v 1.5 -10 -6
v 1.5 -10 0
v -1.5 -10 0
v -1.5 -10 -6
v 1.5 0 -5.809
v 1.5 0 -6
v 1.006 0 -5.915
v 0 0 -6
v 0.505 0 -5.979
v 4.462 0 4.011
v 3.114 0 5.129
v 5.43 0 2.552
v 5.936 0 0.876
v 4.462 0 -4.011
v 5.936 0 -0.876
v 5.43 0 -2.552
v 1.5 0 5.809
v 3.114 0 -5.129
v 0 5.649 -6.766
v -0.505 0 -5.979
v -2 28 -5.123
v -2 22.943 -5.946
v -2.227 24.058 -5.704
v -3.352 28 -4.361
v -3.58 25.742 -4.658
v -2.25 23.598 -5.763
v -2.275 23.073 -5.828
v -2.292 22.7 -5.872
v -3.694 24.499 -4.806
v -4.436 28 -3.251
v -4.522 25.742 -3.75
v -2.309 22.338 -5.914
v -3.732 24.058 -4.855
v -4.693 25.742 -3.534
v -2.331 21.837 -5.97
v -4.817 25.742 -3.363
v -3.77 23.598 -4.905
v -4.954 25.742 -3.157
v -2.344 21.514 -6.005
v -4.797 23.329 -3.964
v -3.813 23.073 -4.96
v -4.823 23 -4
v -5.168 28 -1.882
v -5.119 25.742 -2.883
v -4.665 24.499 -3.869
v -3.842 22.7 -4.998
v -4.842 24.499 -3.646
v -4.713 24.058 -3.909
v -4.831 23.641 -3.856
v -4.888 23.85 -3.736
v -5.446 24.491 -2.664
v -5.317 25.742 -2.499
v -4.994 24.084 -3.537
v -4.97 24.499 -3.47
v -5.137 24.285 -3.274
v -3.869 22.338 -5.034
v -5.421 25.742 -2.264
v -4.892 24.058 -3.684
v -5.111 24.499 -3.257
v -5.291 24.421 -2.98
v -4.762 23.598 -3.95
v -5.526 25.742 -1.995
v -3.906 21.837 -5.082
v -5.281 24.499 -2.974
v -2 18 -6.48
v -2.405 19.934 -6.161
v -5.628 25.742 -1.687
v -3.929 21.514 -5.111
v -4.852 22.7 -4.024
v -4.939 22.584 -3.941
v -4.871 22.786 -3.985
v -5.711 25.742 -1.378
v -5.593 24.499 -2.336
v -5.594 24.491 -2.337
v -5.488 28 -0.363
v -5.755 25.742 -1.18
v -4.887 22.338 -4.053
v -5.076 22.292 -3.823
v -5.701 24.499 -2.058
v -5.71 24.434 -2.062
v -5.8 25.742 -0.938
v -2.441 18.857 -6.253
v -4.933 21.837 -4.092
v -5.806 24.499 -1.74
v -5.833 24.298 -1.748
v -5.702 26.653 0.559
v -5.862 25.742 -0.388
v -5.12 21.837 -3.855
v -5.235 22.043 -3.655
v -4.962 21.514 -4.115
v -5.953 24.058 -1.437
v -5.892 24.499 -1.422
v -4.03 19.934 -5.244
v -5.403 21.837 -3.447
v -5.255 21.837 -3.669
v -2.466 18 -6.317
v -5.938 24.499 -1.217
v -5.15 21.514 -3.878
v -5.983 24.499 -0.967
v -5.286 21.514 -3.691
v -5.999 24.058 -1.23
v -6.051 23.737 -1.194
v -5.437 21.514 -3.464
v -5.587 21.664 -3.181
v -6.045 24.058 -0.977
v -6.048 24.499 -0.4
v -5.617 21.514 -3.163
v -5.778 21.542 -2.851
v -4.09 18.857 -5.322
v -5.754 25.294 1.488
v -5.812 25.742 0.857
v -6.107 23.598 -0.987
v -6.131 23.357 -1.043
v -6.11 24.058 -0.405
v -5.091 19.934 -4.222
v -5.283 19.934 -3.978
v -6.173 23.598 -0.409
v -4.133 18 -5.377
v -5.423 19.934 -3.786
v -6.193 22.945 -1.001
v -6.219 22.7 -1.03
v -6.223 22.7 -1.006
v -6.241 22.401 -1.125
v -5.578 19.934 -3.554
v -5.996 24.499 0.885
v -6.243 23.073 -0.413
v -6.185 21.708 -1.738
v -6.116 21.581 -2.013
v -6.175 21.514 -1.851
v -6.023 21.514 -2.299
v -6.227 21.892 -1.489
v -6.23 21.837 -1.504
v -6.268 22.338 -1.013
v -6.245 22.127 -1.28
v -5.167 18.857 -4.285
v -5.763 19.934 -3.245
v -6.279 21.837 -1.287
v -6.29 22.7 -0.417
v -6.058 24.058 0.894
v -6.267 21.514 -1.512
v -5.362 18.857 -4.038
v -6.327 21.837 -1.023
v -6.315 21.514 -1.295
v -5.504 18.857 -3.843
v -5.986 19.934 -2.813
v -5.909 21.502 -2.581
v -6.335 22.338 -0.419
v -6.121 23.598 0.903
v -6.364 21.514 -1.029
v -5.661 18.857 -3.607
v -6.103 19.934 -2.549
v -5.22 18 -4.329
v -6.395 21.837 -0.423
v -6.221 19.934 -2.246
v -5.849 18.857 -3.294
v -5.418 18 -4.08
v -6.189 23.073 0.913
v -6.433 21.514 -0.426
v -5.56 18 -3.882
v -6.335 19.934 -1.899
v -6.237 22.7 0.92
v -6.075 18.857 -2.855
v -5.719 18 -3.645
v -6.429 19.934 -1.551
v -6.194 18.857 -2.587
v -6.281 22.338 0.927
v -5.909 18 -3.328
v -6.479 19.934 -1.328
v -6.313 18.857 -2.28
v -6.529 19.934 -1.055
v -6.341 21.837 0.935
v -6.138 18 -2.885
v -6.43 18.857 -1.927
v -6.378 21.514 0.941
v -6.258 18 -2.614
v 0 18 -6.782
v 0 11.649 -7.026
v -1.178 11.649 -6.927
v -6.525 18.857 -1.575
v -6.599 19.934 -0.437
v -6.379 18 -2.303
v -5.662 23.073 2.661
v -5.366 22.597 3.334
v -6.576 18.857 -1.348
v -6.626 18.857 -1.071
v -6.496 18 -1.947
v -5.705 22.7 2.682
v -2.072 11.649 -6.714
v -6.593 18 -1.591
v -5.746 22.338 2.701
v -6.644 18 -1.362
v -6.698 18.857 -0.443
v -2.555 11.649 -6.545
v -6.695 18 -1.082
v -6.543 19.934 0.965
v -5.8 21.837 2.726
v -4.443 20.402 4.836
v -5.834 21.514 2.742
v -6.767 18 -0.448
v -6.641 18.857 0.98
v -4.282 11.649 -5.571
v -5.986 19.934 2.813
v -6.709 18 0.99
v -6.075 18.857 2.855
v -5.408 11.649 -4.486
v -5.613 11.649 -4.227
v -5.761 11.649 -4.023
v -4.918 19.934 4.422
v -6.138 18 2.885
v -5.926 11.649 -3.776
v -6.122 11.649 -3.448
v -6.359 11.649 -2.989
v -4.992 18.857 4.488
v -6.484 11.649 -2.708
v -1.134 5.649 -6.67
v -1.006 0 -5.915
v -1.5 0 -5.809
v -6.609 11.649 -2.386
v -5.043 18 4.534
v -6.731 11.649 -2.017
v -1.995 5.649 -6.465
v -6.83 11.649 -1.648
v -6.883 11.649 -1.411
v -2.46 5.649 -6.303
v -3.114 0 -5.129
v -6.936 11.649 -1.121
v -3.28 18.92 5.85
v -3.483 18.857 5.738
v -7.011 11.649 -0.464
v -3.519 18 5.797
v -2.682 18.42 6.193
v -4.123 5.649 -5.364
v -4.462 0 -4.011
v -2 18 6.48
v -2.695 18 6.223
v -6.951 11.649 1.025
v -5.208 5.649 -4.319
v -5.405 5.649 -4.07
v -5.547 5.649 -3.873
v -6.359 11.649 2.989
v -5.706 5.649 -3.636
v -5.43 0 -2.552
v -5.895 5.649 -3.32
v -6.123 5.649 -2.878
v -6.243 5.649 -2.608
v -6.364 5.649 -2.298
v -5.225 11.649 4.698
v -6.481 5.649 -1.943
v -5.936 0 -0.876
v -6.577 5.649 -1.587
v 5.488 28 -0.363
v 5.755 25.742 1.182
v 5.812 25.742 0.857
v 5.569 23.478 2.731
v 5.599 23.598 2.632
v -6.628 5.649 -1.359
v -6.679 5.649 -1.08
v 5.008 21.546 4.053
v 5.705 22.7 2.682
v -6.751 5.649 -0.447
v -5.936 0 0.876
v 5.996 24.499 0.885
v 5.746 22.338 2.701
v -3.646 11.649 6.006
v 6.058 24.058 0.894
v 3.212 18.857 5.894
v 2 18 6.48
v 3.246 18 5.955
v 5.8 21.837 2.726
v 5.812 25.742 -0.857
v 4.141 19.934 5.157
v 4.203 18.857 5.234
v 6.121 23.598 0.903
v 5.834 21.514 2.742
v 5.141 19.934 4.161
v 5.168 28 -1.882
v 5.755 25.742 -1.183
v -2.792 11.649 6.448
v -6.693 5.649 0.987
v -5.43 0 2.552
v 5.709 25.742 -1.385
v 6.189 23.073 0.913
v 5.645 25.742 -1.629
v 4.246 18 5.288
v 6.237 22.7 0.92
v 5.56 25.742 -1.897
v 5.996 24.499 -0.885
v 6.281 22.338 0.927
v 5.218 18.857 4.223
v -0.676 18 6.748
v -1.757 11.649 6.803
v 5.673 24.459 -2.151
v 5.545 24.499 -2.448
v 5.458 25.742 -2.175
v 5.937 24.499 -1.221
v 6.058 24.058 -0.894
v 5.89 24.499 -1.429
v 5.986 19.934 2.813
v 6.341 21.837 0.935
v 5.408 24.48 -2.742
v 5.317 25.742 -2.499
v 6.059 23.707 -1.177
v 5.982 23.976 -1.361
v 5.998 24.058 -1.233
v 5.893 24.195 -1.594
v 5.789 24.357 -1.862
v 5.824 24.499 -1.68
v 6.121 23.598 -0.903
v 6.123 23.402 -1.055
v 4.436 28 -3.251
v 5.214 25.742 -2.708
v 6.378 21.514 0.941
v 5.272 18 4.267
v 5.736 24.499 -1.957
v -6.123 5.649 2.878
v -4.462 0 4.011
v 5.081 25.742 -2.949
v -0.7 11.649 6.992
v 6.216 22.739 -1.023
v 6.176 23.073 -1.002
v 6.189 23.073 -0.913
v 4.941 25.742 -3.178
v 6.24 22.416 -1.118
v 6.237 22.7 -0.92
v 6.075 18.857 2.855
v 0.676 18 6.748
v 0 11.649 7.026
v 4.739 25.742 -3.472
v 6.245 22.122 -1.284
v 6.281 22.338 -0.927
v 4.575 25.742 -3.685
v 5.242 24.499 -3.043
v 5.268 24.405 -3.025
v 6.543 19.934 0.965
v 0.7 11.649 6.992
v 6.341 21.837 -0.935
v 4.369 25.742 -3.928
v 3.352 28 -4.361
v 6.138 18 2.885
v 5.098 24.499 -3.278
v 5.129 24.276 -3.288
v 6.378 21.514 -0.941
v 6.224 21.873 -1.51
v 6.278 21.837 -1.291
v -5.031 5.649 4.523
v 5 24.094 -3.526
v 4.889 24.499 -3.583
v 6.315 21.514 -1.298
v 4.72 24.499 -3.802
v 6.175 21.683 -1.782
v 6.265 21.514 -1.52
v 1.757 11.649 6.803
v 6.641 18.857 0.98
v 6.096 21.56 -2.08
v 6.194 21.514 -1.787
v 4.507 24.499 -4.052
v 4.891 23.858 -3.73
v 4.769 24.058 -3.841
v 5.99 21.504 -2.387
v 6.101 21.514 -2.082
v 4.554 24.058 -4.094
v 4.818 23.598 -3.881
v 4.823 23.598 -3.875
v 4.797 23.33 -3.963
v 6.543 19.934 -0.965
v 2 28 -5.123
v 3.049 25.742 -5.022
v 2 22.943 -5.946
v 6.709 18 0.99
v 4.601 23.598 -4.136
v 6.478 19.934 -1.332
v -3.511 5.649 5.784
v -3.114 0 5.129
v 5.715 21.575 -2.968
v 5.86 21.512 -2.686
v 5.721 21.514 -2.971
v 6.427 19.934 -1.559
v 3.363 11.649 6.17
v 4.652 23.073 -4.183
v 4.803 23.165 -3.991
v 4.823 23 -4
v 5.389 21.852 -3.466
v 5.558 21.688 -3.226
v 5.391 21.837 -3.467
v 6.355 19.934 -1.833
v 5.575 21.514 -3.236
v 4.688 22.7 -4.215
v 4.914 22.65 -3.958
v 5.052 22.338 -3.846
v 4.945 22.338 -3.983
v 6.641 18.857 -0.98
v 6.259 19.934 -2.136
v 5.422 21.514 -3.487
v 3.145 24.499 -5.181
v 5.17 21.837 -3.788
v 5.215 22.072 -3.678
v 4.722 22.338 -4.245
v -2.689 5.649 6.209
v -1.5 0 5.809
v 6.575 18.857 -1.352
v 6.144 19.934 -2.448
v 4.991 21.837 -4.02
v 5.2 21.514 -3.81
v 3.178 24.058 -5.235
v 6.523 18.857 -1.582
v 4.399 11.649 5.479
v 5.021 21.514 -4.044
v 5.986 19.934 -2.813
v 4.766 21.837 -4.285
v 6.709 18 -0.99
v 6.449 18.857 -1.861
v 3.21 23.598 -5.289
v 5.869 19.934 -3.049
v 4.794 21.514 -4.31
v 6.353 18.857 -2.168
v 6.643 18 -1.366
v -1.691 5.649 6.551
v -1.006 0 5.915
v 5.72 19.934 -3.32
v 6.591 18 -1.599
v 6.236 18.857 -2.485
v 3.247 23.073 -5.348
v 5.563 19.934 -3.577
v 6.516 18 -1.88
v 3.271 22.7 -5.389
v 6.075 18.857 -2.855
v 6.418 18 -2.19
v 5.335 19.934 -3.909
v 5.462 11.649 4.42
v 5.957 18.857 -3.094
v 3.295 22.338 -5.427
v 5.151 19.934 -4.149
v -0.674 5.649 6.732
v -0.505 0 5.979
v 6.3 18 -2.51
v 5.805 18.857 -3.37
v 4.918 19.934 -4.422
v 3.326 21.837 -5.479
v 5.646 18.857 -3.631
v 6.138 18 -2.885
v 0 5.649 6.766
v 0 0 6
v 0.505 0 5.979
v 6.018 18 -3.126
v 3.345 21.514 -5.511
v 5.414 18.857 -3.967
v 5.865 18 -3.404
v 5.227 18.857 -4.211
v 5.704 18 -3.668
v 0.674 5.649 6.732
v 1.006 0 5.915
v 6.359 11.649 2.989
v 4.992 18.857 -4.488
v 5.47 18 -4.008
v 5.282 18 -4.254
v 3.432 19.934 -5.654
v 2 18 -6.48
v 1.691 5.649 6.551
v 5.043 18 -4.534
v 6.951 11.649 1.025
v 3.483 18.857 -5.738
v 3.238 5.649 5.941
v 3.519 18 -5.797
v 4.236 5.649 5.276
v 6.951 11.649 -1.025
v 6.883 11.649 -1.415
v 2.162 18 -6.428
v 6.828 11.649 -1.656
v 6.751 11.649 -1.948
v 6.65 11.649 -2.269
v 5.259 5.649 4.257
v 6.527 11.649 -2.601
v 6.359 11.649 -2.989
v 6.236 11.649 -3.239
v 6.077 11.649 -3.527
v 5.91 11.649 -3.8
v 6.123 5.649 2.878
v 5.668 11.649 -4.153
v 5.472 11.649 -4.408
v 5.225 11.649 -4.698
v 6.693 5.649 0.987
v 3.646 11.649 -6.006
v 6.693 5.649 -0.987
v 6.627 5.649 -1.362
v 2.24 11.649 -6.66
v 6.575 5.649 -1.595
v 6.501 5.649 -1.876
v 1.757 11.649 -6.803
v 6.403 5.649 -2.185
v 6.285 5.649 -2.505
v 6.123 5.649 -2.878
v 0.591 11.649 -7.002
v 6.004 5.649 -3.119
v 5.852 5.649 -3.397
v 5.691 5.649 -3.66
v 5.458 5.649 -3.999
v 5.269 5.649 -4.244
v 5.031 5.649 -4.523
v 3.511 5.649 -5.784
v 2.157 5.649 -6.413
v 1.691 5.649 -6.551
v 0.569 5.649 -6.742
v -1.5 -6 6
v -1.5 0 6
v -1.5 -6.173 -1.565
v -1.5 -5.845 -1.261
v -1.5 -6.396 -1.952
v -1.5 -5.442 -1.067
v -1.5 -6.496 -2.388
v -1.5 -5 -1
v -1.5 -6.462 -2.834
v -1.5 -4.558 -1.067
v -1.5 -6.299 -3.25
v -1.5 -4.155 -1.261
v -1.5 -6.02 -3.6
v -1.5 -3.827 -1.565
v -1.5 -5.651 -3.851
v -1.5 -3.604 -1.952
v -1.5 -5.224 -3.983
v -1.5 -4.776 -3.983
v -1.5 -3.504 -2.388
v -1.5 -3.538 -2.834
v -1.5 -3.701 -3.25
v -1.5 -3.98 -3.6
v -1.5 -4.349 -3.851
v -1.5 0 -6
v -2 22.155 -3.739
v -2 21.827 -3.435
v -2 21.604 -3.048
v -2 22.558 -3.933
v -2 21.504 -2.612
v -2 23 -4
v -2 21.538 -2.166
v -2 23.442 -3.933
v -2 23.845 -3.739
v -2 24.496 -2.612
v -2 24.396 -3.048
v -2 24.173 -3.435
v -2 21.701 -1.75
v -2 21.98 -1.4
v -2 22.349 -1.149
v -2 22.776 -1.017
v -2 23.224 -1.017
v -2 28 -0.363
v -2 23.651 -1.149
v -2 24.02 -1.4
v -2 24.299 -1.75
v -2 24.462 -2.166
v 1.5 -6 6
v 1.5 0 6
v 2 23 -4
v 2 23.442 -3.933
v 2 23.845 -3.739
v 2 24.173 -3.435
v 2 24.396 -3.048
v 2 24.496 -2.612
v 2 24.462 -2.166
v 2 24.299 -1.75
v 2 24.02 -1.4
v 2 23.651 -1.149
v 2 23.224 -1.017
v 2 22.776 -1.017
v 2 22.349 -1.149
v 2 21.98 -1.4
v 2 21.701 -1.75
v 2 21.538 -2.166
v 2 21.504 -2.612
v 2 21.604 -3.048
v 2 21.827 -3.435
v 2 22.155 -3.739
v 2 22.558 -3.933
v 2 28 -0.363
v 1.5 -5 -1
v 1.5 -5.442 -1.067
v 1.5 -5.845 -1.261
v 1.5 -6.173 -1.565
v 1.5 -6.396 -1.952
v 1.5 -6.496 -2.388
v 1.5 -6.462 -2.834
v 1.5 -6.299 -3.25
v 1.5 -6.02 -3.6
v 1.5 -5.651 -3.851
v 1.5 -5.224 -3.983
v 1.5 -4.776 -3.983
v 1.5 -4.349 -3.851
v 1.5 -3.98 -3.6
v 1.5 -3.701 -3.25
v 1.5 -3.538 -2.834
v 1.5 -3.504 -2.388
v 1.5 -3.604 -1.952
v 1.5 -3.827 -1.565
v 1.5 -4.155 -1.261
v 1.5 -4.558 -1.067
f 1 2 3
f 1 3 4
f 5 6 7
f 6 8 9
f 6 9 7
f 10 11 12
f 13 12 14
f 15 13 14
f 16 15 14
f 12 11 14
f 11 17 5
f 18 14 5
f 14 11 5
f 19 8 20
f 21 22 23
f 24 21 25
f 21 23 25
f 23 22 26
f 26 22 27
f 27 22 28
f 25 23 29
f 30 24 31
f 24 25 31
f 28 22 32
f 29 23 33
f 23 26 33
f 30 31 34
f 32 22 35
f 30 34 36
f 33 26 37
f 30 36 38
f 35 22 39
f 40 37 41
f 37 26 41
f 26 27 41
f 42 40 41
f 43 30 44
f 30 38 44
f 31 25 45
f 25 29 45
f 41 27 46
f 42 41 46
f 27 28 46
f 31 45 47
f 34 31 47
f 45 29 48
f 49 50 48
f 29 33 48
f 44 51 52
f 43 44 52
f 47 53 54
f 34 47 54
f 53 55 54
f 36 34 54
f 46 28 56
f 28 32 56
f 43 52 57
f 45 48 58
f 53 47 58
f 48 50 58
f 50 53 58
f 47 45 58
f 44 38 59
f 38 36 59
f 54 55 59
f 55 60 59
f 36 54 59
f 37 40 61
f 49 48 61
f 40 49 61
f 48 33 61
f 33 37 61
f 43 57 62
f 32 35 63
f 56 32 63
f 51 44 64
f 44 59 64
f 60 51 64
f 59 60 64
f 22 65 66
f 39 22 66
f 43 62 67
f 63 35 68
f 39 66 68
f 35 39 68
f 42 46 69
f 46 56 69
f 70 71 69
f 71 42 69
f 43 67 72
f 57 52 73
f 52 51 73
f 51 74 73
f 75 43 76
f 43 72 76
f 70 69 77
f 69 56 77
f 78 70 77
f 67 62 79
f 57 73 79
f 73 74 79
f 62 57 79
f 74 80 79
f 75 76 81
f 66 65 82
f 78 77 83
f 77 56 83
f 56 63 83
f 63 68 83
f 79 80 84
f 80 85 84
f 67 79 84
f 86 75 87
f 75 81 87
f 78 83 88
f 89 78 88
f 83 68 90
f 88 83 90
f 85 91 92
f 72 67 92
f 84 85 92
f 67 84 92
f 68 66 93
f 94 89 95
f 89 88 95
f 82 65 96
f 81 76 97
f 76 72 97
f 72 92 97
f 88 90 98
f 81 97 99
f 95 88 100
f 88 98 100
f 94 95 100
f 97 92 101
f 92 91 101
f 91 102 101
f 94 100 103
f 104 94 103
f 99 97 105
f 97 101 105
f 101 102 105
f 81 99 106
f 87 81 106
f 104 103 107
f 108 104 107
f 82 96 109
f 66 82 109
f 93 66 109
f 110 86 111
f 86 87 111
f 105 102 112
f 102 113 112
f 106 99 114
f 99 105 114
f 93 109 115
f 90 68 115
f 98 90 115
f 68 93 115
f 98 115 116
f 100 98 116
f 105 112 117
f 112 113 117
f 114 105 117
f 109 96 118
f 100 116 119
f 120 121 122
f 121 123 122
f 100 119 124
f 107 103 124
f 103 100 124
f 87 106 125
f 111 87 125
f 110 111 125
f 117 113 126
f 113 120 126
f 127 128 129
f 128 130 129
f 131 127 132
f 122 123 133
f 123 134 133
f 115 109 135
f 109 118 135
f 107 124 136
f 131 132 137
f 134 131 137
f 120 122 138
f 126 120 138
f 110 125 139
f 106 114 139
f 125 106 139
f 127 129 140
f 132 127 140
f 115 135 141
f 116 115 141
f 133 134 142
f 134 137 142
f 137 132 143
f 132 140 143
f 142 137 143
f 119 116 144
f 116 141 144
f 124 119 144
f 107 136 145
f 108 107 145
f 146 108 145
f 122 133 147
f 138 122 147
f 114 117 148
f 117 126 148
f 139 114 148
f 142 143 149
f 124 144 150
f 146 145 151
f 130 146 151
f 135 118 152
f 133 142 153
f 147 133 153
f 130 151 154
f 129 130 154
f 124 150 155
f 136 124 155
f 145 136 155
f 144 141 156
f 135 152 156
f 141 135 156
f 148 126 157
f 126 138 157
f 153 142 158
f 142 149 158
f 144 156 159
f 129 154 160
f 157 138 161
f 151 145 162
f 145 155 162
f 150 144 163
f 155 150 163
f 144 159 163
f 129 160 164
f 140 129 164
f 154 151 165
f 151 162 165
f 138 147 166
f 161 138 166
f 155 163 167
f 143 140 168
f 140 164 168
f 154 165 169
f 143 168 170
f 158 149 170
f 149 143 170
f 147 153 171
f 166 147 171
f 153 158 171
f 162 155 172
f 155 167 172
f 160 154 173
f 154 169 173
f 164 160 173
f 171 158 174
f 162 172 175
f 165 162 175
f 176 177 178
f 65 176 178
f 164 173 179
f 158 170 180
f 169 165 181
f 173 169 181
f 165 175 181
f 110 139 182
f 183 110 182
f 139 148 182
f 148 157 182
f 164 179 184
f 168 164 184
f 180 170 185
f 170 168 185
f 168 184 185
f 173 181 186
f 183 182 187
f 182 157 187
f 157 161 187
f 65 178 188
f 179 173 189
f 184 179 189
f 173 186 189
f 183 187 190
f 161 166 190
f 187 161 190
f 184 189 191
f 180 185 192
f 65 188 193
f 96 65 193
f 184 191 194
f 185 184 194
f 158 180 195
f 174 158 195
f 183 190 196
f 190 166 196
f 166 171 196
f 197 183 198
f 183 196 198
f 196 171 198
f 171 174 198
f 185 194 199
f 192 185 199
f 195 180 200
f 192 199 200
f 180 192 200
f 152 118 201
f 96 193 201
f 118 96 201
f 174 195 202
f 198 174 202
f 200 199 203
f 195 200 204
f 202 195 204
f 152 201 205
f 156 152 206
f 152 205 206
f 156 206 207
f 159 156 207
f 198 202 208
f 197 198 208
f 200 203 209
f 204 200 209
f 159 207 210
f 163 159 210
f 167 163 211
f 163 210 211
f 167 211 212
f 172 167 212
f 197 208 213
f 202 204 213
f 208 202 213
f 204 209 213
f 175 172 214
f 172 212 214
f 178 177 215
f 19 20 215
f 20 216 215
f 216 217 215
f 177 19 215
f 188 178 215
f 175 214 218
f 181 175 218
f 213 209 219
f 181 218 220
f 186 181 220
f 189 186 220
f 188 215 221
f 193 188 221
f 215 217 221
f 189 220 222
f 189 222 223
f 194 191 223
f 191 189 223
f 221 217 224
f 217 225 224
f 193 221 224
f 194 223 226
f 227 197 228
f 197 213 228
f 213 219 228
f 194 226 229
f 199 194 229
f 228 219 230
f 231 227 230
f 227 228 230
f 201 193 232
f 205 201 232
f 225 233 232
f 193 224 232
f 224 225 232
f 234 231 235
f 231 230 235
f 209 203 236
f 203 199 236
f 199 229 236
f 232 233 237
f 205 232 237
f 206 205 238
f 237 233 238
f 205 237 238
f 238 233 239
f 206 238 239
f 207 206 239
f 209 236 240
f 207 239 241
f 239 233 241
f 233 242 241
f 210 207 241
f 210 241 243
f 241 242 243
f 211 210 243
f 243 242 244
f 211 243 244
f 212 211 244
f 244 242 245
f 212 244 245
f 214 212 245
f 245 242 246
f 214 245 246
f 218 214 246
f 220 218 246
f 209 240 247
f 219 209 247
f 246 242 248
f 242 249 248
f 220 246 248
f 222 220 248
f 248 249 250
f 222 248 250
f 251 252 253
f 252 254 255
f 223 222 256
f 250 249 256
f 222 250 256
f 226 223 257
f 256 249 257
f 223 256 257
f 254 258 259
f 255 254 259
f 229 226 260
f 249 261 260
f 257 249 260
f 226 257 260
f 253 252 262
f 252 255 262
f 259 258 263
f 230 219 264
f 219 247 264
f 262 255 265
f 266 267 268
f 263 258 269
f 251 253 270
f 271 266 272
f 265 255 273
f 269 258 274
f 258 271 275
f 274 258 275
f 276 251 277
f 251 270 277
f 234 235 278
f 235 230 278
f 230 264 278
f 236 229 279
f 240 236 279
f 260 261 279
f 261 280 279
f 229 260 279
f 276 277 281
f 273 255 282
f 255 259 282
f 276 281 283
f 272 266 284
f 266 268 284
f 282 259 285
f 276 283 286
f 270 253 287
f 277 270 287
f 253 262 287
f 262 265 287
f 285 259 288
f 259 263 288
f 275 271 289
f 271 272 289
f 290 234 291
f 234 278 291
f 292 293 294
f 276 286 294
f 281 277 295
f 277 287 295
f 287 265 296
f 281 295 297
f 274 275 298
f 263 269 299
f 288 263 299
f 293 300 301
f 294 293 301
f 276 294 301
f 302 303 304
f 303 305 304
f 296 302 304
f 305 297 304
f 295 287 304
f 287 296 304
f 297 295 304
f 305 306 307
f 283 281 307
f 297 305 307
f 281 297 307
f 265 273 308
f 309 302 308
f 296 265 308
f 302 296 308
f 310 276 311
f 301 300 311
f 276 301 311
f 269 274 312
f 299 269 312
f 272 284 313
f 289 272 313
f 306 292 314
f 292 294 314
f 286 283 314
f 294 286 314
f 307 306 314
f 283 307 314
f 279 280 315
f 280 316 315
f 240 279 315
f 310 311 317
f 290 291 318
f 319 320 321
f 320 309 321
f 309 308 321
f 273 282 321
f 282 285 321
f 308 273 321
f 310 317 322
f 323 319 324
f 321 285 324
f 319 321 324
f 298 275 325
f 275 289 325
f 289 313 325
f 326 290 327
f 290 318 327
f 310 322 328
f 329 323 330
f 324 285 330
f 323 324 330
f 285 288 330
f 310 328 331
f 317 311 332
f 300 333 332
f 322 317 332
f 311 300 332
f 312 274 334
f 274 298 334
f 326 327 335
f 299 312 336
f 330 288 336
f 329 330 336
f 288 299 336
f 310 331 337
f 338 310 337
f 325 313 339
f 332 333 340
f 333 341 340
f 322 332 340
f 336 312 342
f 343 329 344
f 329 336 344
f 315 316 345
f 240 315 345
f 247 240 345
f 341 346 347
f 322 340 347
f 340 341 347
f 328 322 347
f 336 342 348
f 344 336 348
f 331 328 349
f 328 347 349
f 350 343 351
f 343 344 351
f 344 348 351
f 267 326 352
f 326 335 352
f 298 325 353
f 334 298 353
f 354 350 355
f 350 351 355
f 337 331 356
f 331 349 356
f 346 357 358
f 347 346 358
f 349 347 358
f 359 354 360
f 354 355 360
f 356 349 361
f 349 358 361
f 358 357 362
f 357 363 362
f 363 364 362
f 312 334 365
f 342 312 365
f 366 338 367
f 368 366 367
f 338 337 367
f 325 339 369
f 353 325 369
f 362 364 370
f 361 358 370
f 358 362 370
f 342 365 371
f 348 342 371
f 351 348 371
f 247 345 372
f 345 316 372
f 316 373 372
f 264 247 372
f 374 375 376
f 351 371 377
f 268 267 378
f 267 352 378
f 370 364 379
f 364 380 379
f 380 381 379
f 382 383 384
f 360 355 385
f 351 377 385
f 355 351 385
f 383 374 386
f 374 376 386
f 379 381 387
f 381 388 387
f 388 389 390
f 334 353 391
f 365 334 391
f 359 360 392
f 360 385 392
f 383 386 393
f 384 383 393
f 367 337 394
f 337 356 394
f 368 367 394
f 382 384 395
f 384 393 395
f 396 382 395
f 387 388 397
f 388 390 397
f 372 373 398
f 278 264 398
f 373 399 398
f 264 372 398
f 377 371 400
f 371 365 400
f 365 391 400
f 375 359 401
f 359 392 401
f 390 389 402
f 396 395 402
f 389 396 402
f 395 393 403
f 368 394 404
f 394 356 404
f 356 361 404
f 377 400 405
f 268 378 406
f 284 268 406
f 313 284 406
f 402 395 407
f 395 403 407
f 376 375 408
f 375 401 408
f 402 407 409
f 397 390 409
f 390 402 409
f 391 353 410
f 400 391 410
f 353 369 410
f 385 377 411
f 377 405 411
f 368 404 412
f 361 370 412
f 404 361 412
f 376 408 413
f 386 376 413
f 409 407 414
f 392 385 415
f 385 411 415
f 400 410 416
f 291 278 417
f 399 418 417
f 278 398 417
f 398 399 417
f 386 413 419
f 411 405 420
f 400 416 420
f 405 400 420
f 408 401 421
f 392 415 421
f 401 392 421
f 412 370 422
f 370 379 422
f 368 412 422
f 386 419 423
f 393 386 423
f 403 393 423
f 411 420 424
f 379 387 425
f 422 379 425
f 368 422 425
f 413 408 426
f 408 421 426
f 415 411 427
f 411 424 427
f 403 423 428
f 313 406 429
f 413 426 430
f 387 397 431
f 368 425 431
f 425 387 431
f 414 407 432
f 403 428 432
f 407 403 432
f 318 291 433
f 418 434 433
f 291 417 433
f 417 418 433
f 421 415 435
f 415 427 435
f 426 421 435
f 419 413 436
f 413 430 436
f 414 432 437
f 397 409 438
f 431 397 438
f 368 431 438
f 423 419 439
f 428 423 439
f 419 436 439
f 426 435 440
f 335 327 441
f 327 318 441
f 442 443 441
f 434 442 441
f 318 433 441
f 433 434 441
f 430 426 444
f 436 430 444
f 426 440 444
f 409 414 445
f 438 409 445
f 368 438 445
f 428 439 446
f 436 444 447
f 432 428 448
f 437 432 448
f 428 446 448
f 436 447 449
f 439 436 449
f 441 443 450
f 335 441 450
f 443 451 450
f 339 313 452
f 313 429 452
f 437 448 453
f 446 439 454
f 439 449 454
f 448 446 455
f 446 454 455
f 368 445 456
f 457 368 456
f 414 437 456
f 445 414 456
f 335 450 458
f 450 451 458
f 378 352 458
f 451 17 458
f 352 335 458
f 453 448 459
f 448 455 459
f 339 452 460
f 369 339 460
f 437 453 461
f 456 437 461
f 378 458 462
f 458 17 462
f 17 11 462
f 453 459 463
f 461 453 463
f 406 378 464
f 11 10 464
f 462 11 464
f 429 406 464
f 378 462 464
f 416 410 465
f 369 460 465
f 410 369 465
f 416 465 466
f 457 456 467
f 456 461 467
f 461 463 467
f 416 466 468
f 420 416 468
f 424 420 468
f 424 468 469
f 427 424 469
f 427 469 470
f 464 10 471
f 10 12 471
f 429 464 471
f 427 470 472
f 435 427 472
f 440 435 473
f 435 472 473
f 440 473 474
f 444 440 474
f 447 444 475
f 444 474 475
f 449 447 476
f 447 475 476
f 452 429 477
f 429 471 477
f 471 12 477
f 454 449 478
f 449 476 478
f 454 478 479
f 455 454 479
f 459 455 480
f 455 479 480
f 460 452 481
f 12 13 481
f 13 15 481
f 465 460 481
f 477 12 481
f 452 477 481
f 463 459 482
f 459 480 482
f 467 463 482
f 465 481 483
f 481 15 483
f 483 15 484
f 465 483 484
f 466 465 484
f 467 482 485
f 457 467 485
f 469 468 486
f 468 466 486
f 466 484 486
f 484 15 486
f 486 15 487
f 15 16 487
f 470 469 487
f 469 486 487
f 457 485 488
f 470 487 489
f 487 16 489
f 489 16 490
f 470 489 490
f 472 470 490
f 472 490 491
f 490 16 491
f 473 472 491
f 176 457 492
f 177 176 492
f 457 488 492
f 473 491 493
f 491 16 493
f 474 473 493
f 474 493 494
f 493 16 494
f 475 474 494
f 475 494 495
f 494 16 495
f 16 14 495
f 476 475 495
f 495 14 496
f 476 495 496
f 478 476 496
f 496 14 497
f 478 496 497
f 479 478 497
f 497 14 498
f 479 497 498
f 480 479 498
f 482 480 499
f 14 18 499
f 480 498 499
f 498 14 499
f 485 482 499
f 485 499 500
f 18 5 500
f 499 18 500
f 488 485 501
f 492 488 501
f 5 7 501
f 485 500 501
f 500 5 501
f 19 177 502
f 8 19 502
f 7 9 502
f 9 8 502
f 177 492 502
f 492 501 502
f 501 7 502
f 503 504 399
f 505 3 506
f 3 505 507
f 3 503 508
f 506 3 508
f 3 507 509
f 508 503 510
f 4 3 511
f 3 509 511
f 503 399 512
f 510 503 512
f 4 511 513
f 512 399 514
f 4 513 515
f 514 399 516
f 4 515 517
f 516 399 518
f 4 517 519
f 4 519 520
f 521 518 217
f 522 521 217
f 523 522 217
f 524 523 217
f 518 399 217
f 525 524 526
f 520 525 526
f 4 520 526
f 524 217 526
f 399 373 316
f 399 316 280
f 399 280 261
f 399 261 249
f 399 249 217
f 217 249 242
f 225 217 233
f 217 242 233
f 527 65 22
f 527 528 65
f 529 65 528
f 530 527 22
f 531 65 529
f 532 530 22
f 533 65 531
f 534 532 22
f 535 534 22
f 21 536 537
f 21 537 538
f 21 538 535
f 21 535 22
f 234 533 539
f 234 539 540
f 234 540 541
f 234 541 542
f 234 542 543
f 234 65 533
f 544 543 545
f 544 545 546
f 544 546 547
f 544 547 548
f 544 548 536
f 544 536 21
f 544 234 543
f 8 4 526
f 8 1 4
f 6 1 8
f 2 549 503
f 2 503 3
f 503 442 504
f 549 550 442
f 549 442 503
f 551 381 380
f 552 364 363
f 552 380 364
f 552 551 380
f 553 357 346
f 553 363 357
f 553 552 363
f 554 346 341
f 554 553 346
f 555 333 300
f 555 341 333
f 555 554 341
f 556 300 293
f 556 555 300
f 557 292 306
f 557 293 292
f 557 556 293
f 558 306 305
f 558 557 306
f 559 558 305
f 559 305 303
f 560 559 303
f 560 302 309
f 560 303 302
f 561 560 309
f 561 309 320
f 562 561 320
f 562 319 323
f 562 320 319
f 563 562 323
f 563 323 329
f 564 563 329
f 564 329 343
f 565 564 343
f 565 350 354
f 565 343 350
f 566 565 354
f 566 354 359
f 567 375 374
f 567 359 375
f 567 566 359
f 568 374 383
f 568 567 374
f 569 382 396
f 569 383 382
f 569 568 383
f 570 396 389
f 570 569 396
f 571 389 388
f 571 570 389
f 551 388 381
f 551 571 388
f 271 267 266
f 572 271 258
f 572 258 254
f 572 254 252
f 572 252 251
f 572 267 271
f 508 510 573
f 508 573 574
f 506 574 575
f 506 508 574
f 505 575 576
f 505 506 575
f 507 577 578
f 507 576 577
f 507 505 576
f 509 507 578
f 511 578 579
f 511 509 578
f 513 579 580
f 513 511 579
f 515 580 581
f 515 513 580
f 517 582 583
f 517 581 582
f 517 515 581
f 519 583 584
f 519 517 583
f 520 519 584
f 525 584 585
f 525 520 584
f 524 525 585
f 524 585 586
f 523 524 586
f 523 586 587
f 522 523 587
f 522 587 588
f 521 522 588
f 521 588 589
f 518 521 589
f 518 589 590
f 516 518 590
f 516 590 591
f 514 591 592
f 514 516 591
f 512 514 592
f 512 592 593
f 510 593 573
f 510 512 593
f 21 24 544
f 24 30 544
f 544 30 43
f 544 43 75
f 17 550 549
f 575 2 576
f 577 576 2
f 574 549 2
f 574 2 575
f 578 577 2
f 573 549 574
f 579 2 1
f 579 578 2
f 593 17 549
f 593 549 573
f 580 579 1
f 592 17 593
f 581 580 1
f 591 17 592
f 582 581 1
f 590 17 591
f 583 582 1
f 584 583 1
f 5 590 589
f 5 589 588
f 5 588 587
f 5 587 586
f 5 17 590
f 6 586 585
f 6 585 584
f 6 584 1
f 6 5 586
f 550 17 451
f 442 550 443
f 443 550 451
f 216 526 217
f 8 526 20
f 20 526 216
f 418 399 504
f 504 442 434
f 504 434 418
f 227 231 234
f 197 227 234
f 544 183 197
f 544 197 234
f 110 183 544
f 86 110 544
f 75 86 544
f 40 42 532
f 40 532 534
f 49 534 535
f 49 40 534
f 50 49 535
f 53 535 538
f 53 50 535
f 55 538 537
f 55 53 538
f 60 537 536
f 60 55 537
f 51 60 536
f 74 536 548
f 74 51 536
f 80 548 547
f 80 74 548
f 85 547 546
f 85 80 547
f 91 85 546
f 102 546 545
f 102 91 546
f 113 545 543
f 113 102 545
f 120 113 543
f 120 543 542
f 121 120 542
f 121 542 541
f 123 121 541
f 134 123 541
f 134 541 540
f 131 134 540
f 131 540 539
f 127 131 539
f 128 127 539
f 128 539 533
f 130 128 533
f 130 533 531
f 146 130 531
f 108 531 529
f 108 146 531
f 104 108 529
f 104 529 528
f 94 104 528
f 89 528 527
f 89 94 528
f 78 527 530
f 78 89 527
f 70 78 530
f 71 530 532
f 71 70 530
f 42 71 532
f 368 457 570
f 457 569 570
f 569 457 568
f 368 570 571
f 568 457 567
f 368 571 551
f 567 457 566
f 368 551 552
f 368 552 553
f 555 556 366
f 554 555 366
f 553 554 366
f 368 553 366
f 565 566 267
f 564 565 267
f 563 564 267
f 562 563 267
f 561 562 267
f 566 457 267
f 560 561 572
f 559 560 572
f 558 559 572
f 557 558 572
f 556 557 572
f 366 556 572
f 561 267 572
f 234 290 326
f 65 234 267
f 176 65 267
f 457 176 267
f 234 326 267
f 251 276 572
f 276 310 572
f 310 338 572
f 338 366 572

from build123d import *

# Parameters (mm, degrees)
SKETCH3_W               = 4
SKETCH3_H               = 10
CUT_EXTRUDE2_DEPTH      = 11.5
CUT_EXTRUDE3_DEPTH      = 30.711019541
CUT_EXTRUDE3_DEPTH_BACK = 30.711019541
BOSS_EXTRUDE1_DEPTH     = 1.5
CUT_EXTRUDE4_DEPTH      = 30.711019541
CUT_EXTRUDE4_DEPTH_BACK = 30.711019541
SKETCH5_R               = 1.5


with BuildPart() as part:
    # Sketch1 → Revolve1 (revolve)
    with BuildSketch(Plane(origin=(0, 0, 0), x_dir=(0, 0, -1), z_dir=(1, 0, 0))):
        with BuildLine():
            Line((0, 0), (0, 28))
            Line((0, 28), (5.5, 28))
            add(Edge.make_bspline(
                [(5.5, 28), (8.278370843, 12.243075952), (6, 0)],
                knots=[0, 0, 0, 1, 1, 1], degree=2))
            Line((6, 0), (0, 0))
        make_face()
    revolve(axis=Axis((0, 0, 0), (0, 1, 0)))

    # Sketch3 → Cut-Extrude2 (cut, symmetric)
    with BuildSketch(Plane.XY):
        with Locations((0, 23)):
            Rectangle(SKETCH3_W, SKETCH3_H)
    extrude(amount=CUT_EXTRUDE2_DEPTH, both=True, mode=Mode.SUBTRACT)

    # Sketch4 → Cut-Extrude3 (cut, two sides: drawn at the far end of the back side and taken through both)
    with BuildSketch(Plane(origin=(0, 0, 0), x_dir=(0, 0, -1), z_dir=(1, 0, 0)).offset(-CUT_EXTRUDE3_DEPTH_BACK)):
        Polygon((-6.781758395, 28), (-6.480142509, 18), (0.363394388, 28), align=None)
    extrude(amount=CUT_EXTRUDE3_DEPTH + CUT_EXTRUDE3_DEPTH_BACK, mode=Mode.SUBTRACT)

    # Sketch6 → Boss-Extrude1 (add, symmetric)
    with BuildSketch(Plane(origin=(0, 0, 0), x_dir=(0, 0, -1), z_dir=(1, 0, 0))):
        Polygon((-6, 0), (-6, -6), (0, -10), (6, -10), (6, 0), align=None)
    extrude(amount=BOSS_EXTRUDE1_DEPTH, both=True)

    # Sketch5 → Cut-Extrude4 (cut, two sides: drawn at the far end of the back side and taken through both)
    with BuildSketch(Plane(origin=(0, 0, 0), x_dir=(0, 0, -1), z_dir=(1, 0, 0)).offset(-CUT_EXTRUDE4_DEPTH_BACK)):
        with Locations((2.5, 23)):
            Circle(SKETCH5_R)
        with Locations(Location((2.5, -5, 0), (0, 0, 180))):
            Circle(SKETCH5_R)
    extrude(amount=CUT_EXTRUDE4_DEPTH + CUT_EXTRUDE4_DEPTH_BACK, mode=Mode.SUBTRACT)


solid = part.part
